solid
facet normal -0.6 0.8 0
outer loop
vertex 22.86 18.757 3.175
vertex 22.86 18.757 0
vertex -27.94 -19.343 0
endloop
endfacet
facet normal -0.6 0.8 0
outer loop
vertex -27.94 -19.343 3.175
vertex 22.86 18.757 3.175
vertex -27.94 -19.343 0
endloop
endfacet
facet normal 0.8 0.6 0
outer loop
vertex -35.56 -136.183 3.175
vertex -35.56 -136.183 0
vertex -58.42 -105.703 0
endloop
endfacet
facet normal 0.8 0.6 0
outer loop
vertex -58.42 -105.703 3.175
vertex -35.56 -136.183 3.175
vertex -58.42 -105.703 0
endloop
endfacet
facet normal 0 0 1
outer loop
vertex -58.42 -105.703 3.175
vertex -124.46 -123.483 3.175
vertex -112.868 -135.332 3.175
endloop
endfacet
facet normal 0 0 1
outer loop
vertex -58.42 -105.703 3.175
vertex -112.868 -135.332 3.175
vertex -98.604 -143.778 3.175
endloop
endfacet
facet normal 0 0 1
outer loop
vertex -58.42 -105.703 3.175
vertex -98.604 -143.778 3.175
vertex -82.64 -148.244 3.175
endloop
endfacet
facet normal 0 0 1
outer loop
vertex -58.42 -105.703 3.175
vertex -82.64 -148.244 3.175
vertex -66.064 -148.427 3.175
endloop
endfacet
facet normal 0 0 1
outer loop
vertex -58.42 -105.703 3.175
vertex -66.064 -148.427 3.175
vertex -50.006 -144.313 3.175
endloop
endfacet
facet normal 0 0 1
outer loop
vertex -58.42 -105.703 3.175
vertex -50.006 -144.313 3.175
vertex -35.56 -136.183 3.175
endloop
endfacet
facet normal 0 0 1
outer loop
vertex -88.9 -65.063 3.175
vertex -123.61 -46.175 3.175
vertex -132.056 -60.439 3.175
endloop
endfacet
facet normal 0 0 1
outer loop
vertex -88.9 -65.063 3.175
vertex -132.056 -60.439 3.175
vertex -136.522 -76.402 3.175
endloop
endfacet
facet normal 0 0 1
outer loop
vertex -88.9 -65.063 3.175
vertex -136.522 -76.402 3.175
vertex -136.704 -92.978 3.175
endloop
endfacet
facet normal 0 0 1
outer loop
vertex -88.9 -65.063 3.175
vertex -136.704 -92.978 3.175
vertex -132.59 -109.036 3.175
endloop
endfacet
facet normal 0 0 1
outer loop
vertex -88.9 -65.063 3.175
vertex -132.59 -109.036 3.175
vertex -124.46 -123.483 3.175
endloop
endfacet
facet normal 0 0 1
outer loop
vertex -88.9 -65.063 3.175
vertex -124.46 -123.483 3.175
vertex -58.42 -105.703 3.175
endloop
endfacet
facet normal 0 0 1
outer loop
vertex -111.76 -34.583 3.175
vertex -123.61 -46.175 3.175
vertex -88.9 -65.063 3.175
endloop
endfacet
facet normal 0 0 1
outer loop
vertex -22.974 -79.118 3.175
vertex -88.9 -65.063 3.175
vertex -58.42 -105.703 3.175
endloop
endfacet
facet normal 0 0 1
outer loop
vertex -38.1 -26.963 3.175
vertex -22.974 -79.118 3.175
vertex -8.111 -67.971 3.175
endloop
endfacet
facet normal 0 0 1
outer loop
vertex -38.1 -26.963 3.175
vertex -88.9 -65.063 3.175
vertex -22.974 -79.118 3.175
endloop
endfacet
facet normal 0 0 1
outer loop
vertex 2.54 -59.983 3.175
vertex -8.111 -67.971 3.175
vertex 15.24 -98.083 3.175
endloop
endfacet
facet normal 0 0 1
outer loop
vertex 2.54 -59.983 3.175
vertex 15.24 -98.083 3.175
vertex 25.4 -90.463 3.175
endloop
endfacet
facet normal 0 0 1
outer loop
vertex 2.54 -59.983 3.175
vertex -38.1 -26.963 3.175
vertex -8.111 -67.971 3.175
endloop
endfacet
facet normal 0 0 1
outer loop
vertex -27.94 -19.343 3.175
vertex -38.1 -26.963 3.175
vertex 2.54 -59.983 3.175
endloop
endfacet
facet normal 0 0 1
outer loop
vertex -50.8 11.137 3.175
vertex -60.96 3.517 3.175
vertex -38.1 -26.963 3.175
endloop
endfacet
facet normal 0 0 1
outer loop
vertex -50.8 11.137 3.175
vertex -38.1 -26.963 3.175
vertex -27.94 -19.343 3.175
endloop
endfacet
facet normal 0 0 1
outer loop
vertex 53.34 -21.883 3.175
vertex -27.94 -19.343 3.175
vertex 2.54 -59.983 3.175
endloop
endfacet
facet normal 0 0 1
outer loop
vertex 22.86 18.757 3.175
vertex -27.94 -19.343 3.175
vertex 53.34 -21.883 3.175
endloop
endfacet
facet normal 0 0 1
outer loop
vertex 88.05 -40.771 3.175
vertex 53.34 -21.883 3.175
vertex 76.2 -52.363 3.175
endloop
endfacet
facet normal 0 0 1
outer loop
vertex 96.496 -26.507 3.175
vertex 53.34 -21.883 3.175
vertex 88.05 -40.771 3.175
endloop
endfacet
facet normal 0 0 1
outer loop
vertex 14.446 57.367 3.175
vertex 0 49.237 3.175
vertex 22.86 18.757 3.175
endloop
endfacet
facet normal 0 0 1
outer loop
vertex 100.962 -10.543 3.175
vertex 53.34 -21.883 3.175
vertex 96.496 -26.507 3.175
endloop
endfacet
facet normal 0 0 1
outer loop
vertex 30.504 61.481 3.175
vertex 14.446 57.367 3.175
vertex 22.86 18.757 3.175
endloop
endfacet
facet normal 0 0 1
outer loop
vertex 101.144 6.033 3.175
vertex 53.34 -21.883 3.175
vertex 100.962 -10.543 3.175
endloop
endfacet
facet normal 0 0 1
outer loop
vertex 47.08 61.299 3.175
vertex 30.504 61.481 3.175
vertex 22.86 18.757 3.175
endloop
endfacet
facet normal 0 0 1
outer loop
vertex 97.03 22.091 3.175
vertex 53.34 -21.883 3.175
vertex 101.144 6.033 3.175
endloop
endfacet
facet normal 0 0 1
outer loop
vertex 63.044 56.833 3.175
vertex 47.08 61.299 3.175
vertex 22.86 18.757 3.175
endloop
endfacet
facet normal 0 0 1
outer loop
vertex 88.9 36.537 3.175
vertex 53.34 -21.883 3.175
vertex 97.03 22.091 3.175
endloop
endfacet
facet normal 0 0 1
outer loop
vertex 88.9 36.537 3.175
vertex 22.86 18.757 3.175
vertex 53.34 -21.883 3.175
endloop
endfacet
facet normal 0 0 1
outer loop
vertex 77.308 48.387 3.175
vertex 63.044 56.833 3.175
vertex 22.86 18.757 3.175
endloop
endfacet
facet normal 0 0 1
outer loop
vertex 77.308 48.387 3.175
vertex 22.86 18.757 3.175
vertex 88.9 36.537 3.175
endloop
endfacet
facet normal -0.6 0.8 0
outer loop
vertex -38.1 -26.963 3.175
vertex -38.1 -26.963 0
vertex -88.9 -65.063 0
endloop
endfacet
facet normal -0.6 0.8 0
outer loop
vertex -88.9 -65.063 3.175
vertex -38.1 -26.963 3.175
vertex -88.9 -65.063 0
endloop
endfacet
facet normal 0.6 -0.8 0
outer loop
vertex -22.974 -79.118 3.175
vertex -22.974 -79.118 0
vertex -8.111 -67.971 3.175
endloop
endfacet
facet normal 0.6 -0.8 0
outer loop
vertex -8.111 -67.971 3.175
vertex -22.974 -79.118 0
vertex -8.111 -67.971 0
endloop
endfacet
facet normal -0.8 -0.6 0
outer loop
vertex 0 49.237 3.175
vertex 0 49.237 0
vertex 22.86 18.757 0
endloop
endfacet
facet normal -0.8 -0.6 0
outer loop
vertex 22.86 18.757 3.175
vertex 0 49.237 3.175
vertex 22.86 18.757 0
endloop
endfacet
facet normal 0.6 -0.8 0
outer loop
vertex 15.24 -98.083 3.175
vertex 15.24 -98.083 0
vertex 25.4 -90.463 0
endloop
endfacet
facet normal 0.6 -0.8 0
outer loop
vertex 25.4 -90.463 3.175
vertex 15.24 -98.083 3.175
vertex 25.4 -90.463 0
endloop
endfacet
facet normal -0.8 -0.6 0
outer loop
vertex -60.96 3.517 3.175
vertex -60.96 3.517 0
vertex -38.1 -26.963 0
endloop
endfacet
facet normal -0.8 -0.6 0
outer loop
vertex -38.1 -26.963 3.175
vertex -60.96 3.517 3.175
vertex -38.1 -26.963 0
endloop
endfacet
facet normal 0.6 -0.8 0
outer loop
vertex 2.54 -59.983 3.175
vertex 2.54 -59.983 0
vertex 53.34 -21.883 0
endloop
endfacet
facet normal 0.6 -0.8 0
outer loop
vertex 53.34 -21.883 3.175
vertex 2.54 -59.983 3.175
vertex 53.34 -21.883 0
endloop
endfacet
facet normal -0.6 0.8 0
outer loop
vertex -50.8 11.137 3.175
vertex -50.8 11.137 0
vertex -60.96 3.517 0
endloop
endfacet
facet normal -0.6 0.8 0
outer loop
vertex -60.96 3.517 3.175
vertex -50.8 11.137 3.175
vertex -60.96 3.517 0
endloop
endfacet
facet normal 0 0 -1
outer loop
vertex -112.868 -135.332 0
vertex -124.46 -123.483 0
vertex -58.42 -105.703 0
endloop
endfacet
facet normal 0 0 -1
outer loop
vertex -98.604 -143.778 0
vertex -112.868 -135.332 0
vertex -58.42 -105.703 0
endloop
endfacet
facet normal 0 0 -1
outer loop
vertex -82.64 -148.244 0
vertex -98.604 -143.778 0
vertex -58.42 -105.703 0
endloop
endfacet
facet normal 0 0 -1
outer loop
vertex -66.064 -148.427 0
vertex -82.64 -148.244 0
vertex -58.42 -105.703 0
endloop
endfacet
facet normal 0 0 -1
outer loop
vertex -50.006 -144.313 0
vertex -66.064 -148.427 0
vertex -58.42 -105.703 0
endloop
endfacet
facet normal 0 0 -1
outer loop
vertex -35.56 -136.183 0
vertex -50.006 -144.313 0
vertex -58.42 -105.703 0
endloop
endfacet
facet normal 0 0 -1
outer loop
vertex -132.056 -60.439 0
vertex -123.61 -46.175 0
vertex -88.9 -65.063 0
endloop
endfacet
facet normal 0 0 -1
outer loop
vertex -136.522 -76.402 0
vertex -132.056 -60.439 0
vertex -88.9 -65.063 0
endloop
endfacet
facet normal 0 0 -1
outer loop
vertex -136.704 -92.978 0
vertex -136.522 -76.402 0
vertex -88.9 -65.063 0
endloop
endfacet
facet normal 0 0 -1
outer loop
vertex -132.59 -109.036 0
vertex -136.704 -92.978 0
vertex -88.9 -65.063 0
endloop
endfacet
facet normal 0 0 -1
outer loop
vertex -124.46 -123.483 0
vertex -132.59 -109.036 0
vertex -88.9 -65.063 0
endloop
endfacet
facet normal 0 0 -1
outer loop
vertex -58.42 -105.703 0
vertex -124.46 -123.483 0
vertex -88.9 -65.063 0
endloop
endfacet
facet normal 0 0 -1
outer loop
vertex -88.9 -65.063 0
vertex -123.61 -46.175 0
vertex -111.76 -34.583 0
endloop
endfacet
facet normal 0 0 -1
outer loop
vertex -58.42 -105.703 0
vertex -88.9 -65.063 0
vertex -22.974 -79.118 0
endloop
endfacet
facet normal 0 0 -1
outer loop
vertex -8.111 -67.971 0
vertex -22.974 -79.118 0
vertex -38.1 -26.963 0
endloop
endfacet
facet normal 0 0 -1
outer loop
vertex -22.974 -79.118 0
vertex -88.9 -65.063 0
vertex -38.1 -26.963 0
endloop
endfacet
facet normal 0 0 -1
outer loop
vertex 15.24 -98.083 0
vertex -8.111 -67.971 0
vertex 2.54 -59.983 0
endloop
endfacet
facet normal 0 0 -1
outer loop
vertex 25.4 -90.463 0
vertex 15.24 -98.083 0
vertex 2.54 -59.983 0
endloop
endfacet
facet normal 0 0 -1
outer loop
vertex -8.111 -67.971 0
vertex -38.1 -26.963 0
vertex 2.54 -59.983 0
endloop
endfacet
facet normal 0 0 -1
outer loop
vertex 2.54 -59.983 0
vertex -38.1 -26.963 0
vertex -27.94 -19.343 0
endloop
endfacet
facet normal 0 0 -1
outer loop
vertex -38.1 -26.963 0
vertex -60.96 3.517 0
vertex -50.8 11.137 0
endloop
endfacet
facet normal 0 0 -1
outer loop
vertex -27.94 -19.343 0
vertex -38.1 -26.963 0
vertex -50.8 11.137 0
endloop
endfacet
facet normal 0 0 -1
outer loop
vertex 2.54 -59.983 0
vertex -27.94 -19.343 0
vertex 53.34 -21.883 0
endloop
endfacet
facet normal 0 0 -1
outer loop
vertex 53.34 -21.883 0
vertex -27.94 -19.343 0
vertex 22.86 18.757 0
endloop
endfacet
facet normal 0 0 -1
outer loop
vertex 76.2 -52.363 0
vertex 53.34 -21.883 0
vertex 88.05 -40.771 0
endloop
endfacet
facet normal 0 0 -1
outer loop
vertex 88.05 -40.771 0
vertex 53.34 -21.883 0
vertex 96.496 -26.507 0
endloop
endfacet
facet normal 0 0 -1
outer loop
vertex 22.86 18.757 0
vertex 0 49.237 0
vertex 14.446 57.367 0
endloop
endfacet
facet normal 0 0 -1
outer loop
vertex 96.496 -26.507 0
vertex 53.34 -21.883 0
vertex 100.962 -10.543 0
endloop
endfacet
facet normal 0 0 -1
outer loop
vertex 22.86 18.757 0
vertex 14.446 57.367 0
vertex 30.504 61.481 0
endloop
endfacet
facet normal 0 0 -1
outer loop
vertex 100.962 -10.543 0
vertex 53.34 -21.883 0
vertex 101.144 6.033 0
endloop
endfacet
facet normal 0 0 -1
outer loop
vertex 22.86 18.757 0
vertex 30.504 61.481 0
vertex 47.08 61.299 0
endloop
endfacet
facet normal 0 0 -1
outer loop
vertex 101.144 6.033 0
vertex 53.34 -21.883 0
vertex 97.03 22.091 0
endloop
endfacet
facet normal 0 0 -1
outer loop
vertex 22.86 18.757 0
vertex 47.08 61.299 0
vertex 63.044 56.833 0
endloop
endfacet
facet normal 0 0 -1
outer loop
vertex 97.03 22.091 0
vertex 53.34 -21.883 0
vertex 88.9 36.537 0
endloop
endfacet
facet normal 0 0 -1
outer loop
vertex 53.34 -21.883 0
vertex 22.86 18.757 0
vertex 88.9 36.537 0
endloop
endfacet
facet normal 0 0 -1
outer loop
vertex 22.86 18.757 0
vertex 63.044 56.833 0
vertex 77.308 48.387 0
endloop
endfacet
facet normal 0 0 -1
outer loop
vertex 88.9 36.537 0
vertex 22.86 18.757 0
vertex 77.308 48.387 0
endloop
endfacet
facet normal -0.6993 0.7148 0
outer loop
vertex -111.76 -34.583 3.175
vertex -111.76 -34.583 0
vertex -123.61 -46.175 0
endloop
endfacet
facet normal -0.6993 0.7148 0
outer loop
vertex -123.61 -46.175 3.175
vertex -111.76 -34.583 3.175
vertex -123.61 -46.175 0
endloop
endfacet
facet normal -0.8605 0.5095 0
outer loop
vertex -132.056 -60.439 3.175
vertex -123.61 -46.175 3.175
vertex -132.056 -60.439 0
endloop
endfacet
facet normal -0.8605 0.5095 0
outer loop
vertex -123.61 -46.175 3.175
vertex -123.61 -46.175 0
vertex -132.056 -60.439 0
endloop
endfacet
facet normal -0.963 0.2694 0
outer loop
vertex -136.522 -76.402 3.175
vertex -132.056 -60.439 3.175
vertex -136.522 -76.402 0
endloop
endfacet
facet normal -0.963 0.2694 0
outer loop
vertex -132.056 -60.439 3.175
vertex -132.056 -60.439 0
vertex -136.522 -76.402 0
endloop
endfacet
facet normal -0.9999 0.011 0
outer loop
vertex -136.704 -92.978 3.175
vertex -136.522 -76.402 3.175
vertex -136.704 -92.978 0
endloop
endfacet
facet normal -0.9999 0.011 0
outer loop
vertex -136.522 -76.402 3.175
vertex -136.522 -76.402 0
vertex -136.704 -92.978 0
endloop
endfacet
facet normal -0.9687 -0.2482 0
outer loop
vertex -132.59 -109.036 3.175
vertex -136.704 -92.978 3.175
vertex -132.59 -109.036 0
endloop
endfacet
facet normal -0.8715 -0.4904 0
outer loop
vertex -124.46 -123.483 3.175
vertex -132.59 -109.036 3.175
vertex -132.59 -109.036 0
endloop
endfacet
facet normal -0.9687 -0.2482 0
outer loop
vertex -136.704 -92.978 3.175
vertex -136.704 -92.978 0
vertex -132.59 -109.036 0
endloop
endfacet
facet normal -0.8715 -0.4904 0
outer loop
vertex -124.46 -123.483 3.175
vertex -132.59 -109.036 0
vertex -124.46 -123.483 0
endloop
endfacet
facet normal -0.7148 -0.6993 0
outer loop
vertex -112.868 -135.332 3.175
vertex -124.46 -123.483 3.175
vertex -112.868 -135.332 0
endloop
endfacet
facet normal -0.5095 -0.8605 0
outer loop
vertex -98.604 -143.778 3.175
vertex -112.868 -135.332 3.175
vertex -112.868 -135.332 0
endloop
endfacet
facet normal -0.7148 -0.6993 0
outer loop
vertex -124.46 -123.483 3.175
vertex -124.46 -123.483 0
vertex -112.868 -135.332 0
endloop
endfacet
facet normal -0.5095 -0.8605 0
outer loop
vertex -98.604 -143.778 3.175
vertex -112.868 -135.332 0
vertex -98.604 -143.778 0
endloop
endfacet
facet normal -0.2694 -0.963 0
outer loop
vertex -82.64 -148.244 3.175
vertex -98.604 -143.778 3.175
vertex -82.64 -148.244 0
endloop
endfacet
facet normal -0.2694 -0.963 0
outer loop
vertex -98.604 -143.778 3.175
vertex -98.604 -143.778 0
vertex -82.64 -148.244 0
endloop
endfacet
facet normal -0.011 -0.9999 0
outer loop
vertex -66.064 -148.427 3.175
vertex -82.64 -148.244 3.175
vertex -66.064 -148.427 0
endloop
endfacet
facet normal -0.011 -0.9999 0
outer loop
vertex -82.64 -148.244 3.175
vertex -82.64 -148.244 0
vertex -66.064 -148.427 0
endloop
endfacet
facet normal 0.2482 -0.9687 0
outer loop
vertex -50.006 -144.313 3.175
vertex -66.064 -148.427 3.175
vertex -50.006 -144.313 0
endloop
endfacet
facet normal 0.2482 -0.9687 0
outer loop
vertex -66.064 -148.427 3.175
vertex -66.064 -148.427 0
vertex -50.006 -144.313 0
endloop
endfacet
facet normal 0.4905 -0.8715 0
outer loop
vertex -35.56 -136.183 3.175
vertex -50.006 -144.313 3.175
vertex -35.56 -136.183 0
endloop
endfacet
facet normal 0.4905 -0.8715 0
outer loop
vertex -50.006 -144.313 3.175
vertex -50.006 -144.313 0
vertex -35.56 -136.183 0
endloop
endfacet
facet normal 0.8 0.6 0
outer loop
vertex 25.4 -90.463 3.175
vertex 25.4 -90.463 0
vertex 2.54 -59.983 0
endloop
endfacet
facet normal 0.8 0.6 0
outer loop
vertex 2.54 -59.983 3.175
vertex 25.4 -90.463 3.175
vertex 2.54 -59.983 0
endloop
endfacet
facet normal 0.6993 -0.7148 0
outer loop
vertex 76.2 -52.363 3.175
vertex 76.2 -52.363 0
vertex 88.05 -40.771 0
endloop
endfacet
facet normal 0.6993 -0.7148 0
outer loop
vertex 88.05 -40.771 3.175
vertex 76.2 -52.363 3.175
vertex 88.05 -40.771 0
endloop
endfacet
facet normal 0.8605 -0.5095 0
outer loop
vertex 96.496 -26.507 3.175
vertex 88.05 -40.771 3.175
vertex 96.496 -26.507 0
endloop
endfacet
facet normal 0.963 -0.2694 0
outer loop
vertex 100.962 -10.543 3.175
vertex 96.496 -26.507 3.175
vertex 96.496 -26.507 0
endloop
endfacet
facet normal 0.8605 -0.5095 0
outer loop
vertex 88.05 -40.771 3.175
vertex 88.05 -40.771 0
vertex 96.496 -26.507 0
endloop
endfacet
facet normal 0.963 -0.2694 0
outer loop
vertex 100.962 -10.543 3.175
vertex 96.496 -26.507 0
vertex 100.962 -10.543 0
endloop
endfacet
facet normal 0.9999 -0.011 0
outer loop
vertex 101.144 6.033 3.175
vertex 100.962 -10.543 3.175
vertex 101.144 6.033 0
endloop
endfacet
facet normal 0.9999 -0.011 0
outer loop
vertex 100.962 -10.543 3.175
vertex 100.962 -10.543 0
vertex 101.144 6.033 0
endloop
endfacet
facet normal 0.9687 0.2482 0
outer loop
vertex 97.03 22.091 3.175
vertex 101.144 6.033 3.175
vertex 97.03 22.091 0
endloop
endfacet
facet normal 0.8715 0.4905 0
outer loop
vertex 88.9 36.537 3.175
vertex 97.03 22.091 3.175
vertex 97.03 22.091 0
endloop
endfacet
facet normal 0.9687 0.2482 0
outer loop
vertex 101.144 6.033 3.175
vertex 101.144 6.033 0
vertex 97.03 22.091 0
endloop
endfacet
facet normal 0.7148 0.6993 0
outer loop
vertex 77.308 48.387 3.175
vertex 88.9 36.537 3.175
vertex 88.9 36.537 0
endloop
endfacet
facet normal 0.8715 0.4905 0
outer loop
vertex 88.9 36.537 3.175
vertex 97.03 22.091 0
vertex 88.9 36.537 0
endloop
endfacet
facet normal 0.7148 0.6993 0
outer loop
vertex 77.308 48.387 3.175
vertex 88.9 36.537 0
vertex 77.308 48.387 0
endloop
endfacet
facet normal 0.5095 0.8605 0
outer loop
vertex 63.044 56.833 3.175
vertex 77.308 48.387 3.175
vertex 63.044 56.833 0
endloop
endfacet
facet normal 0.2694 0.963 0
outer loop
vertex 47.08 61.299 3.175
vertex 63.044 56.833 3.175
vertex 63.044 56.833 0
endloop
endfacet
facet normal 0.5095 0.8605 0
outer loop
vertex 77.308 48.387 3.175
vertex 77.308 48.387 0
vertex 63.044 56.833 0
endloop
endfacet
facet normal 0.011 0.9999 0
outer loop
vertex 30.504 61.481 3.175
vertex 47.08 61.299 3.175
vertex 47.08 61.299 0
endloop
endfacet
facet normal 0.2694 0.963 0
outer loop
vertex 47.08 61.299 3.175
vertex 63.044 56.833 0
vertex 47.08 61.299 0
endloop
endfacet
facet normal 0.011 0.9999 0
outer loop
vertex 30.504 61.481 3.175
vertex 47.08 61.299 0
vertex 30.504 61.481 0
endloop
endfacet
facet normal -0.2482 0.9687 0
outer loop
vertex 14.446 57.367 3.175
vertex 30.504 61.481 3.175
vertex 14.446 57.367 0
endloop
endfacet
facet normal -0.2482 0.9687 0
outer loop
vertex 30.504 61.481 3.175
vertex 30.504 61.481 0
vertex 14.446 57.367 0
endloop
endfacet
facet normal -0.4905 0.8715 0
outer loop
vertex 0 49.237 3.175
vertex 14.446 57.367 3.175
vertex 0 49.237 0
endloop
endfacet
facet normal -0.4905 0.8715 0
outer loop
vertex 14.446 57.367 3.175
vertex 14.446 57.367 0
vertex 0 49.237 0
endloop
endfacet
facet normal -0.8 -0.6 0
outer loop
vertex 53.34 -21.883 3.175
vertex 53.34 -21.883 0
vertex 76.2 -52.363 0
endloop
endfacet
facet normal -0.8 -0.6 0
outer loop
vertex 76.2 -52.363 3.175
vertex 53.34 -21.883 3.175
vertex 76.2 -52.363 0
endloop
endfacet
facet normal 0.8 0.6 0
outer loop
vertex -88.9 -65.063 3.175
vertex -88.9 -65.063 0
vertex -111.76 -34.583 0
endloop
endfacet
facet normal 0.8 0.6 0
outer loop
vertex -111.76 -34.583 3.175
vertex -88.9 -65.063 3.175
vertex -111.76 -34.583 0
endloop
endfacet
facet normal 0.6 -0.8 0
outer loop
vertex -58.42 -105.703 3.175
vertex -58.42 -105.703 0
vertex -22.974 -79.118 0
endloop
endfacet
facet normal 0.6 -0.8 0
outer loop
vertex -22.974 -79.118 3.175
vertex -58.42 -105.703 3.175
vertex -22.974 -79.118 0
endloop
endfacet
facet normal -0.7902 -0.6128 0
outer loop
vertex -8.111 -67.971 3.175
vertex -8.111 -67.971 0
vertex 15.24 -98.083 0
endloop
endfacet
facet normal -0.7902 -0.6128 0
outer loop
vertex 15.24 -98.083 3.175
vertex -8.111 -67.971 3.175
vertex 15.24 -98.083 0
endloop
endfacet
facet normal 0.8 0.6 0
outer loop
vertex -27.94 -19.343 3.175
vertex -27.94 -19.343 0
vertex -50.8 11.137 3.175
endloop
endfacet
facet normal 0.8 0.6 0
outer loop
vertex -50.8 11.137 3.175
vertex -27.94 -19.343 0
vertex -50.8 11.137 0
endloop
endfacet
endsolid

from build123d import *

# Parameters (mm, degrees)
F1_DEPTH = 3.175
F3_DEPTH = 50.8
F4_R     = 6.35
F5_DEPTH = 50.8


# Not quite as in the source:
# - a length typed as a fraction of an inch, garbled in the dataset ("3 / 203.2 mm" for 3/8 in), is restored


with BuildPart() as f1:
    # F0 (on Top) → F1 (new body)
    with BuildSketch(Plane.XY):
        with BuildLine():
            Line((53.34, -21.8826867197), (76.2, -52.3626867197))
            ThreePointArc((76.2, -52.3626867197), (88.9, 36.5373132803), (0, 49.2373132803))
            Line((0, 49.2373132803), (22.86, 18.7573132803))
            Line((22.86, 18.7573132803), (-27.94, -19.3426867197))
            Line((-27.94, -19.3426867197), (-50.8, 11.1373132803))
            Line((-50.8, 11.1373132803), (-60.96, 3.5173132803))
            Line((-60.96, 3.5173132803), (-38.1, -26.9626867197))
            Line((-38.1, -26.9626867197), (-88.9, -65.0626867197))
            Line((-88.9, -65.0626867197), (-111.76, -34.5826867197))
            ThreePointArc((-111.76, -34.5826867197), (-124.46, -123.4826867197), (-35.56, -136.1826867197))
            Line((-35.56, -136.1826867197), (-58.42, -105.7026867197))
            Line((-58.42, -105.7026867197), (-22.9741035603, -79.11826439))
            Line((-22.9741035603, -79.11826439), (-8.1111921991, -67.971080869))
            Line((-8.1111921991, -67.971080869), (15.24, -98.0826867197))
            Line((15.24, -98.0826867197), (25.4, -90.4626867197))
            Line((25.4, -90.4626867197), (2.54, -59.9826867197))
            Line((2.54, -59.9826867197), (53.34, -21.8826867197))
        make_face()
    extrude(amount=F1_DEPTH)

    # F2 (on face) → F3 (cut)
    with BuildSketch(Plane(origin=(29.7060896255, -39.6081195006, 0), x_dir=(0.8, 0.6, 0), z_dir=(0.6, -0.8, 0))):
        with BuildLine():
            ThreePointArc((-78.7146071563, -9.525), (-83.2047352168, -20.3651280605), (-72.3646071563, -15.875))
            ThreePointArc((-72.3646071563, -15.875), (-74.2244790957, -11.3848719395), (-78.7146071563, -9.525))
        make_face()
    extrude(amount=-F3_DEPTH, mode=Mode.SUBTRACT)

    # F4 (on face) → F5 (cut)
    with BuildSketch(Plane(origin=(-0.7739103745, 1.0318804994, 0), x_dir=(-0.8, -0.6, 0), z_dir=(-0.6, 0.8, 0))):
        with Locations((2.2076120318, -15.875)):
            Circle(F4_R)
    extrude(amount=-F5_DEPTH, mode=Mode.SUBTRACT)


solid = f1.part
